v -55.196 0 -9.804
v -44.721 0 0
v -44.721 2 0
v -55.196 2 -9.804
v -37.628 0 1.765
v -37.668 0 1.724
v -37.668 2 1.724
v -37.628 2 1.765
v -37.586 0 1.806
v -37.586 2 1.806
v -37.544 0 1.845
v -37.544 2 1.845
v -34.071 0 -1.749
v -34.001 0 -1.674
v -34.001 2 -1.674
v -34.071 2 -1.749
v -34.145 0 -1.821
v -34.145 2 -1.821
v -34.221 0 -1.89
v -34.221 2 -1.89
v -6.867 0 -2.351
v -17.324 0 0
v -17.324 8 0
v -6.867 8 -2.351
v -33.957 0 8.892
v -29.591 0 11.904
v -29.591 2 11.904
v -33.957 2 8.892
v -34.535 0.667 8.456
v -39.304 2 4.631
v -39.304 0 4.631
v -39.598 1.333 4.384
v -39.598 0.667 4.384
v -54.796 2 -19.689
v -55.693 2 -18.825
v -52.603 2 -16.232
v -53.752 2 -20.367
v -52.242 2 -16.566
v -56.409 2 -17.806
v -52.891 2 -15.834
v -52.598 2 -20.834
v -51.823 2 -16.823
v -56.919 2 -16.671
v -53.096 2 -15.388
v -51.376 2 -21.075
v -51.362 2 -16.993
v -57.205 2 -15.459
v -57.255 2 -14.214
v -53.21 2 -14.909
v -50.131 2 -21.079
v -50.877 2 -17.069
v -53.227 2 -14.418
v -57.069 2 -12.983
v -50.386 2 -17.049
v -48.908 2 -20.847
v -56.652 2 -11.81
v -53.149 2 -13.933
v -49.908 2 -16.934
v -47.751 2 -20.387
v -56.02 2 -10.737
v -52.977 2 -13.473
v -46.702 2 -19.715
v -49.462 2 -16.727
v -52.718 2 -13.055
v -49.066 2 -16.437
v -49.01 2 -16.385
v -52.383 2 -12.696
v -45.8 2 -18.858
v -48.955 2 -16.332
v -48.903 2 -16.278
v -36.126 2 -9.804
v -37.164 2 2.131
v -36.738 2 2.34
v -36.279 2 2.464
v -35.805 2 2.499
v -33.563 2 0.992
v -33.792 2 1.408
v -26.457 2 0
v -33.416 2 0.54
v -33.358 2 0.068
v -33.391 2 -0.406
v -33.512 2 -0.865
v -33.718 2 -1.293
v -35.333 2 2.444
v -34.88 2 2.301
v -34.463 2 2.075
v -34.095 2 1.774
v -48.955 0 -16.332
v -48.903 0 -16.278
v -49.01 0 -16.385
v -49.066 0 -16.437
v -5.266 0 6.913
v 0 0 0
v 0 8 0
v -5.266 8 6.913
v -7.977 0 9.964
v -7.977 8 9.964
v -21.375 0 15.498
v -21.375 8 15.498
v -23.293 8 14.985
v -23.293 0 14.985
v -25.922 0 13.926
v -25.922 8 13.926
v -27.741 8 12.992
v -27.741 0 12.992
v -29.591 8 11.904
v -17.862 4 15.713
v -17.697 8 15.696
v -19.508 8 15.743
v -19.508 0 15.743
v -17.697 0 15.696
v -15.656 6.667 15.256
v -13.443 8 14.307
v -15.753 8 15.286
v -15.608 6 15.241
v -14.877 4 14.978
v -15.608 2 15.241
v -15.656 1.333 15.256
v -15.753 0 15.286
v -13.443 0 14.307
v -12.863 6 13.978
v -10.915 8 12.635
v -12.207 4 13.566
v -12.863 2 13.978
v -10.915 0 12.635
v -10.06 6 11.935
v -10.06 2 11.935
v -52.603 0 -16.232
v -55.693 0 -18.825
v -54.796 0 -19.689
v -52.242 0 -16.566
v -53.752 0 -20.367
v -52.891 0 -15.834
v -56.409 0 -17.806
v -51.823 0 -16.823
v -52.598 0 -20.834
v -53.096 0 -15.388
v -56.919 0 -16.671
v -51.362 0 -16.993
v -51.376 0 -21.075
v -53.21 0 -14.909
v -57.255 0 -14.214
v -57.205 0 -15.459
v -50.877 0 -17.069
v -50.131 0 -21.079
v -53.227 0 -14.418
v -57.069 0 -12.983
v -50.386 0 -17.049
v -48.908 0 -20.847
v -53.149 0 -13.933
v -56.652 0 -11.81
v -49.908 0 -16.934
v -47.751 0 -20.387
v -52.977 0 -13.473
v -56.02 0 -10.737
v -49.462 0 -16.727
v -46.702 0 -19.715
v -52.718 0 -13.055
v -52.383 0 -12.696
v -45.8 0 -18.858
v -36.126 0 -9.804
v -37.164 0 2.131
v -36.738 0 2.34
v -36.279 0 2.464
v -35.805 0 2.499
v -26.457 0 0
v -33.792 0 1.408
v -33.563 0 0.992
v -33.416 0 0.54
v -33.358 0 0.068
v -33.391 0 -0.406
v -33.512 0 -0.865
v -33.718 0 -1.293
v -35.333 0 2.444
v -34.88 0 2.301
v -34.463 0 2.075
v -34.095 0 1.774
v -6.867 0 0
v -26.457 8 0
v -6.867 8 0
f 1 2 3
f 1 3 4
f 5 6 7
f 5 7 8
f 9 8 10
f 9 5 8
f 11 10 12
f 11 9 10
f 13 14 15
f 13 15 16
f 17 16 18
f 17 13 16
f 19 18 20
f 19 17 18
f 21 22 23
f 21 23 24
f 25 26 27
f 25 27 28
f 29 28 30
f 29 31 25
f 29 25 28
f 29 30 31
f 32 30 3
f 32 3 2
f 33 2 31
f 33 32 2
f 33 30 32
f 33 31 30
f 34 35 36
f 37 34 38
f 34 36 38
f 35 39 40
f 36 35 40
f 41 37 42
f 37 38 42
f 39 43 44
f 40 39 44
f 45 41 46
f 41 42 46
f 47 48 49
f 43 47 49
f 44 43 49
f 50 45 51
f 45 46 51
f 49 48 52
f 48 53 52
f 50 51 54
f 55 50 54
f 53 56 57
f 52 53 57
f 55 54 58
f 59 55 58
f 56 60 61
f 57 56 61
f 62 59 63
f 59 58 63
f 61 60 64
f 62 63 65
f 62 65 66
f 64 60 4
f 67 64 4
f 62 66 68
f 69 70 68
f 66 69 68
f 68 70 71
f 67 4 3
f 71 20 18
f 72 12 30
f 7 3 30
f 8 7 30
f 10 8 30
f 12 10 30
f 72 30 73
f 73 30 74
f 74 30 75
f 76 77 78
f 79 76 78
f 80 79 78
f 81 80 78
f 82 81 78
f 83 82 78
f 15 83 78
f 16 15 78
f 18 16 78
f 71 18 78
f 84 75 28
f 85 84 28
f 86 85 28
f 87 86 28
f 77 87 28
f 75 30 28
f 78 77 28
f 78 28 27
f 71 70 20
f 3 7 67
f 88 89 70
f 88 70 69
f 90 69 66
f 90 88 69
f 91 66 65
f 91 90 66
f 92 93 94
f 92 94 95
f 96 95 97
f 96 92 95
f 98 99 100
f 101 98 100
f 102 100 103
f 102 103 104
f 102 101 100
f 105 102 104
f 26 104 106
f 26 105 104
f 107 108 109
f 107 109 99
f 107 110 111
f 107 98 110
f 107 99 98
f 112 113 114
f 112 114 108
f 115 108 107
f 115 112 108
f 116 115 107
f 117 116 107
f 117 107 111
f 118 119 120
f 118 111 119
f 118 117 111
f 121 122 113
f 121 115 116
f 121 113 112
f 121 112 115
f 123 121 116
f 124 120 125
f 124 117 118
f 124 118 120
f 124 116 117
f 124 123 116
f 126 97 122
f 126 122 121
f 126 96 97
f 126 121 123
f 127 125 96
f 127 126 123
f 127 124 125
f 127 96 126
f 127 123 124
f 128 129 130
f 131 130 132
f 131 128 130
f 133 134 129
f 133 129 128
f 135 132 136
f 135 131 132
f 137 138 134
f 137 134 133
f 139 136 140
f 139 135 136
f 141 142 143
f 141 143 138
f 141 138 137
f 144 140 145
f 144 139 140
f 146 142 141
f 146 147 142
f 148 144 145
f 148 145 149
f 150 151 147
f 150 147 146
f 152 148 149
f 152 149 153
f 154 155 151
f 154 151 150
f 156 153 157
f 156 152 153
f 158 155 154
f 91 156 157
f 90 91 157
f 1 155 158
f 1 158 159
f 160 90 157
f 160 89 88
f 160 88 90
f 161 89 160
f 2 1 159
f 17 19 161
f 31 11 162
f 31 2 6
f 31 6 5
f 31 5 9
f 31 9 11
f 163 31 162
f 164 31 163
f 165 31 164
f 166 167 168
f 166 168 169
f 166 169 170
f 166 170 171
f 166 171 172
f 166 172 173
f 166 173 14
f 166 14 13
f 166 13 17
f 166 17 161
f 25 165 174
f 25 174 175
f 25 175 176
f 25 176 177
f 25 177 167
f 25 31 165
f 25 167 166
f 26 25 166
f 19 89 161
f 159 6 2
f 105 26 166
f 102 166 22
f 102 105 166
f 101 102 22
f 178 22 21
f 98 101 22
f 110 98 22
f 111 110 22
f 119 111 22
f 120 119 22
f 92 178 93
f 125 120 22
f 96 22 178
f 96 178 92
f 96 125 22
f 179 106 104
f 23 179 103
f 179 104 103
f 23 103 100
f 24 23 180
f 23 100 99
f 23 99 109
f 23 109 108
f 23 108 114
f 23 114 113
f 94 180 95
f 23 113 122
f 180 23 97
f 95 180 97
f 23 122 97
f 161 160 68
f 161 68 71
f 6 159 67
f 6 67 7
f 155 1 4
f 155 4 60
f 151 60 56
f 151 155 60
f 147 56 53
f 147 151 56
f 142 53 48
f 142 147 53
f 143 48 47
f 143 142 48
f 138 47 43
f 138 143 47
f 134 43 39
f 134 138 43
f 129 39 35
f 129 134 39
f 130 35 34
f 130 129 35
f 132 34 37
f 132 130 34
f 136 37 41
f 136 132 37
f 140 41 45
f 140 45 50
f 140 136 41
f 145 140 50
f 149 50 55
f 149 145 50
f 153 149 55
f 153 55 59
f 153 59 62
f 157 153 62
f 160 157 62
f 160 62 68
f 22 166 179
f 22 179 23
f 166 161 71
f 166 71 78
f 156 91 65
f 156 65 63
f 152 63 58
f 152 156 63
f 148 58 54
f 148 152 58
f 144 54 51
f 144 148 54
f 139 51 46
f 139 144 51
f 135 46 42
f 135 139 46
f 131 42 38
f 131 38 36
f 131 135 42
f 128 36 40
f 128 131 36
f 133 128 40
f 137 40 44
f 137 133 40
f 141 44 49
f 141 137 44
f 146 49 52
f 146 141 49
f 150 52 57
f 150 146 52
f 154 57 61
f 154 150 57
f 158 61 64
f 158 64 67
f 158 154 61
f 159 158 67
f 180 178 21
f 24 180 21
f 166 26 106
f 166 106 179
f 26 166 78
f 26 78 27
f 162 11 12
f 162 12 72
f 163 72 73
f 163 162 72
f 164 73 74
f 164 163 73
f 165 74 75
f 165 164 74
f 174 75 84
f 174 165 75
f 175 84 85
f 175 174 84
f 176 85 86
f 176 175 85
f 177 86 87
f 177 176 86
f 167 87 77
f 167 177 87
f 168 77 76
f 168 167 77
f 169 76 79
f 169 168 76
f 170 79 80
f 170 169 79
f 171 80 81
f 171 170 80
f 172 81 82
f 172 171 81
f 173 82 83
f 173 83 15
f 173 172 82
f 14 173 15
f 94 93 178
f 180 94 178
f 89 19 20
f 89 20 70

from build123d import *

# Parameters (mm, degrees)
F1_DEPTH = 8
F2_DEPTH = 2
F3_DEPTH = 25


with BuildPart() as f1:
    # F0 (on Front) → F1 (new body)
    with BuildSketch(Plane.XZ):
        with BuildLine():
            Line((-6.8668625318, 0), (0, 0))
            add(Edge.make_bspline(
                [(0, 0), (-5.5166817517, 7.5273476461), (-13.9427053961, 19.0244054975), (-25.4283193392, 14.4964589712), (-29.5906448635, 11.9035035184)],
                knots=[0, 0, 0, 0, 0.4664815309, 0.7124906939, 0.7124906939, 0.7124906939, 0.7124906939], degree=3))
            Line((-29.5906448635, 11.9035035184), (-26.4566000551, 0))
            Line((-26.4566000551, 0), (-17.324373126, 0))
            Line((-17.324373126, 0), (-6.8668625318, -2.3509128803))
            Line((-6.8668625318, -2.3509128803), (-6.8668625318, 0))
        make_face()
        Polygon((0, -3.8946259301), (0, 0), (-6.8668625318, 0), (-6.8668625318, -2.3509128803), align=None)
    extrude(amount=-F1_DEPTH)

    # F0 (on Front) → F3 (cut)
    with BuildSketch(Plane.XZ):
        Polygon((0, -3.8946259301), (0, 0), (-6.8668625318, 0), (-6.8668625318, -2.3509128803), align=None)
    extrude(amount=-F3_DEPTH, mode=Mode.SUBTRACT)


with BuildPart() as f2:
    # F0 (on Front) → F2 (new body)
    with BuildSketch(Plane.XZ):
        with BuildLine():
            Line((-26.4566000551, 0), (-29.5906448635, 11.9035035184))
            add(Edge.make_bspline(
                [(-29.5906448635, 11.9035035184), (-34.4551275869, 8.8731333733), (-39.5880898188, 4.4365666867), (-44.7210520506, 0)],
                knots=[0.7124906939, 0.7124906939, 0.7124906939, 0.7124906939, 1, 1, 1, 1], degree=3))
            Line((-44.7210520506, 0), (-55.1962554455, -9.8037142307))
            ThreePointArc((-55.1962554455, -9.8037142307), (-55.2651318504, -19.2779776557), (-45.7999520147, -18.85752304))
            Line((-45.7999520147, -18.85752304), (-36.1260175705, -9.8037142307))
            Line((-36.1260175705, -9.8037142307), (-26.4566000551, 0))
        make_face()
        with BuildLine():
            ThreePointArc((-34.0009998268, -1.6744260512), (-34.1076420427, -1.7855743191), (-34.2209268371, -1.8899441183))
            Line((-34.2209268371, -1.8899441183), (-48.9028869032, -16.2775705017))
            ThreePointArc((-48.9028869032, -16.2775705017), (-48.9824013436, -16.359123751), (-49.065547898, -16.4369705825))
            ThreePointArc((-49.065547898, -16.4369705825), (-52.6027386022, -16.2321661604), (-52.3827507862, -12.6958872842))
            Line((-52.3827507862, -12.6958872842), (-37.6682687749, 1.7236090672))
            ThreePointArc((-37.6682687749, 1.7236090672), (-37.6071987867, 1.7855743191), (-37.5440096809, 1.8453771016))
            ThreePointArc((-37.5440096809, 1.8453771016), (-34.095471429, 1.7735658352), (-34.0009998268, -1.6744260512))
        make_face(mode=Mode.SUBTRACT)
    extrude(amount=-F2_DEPTH)


solid = Compound([f1.part, f2.part])
